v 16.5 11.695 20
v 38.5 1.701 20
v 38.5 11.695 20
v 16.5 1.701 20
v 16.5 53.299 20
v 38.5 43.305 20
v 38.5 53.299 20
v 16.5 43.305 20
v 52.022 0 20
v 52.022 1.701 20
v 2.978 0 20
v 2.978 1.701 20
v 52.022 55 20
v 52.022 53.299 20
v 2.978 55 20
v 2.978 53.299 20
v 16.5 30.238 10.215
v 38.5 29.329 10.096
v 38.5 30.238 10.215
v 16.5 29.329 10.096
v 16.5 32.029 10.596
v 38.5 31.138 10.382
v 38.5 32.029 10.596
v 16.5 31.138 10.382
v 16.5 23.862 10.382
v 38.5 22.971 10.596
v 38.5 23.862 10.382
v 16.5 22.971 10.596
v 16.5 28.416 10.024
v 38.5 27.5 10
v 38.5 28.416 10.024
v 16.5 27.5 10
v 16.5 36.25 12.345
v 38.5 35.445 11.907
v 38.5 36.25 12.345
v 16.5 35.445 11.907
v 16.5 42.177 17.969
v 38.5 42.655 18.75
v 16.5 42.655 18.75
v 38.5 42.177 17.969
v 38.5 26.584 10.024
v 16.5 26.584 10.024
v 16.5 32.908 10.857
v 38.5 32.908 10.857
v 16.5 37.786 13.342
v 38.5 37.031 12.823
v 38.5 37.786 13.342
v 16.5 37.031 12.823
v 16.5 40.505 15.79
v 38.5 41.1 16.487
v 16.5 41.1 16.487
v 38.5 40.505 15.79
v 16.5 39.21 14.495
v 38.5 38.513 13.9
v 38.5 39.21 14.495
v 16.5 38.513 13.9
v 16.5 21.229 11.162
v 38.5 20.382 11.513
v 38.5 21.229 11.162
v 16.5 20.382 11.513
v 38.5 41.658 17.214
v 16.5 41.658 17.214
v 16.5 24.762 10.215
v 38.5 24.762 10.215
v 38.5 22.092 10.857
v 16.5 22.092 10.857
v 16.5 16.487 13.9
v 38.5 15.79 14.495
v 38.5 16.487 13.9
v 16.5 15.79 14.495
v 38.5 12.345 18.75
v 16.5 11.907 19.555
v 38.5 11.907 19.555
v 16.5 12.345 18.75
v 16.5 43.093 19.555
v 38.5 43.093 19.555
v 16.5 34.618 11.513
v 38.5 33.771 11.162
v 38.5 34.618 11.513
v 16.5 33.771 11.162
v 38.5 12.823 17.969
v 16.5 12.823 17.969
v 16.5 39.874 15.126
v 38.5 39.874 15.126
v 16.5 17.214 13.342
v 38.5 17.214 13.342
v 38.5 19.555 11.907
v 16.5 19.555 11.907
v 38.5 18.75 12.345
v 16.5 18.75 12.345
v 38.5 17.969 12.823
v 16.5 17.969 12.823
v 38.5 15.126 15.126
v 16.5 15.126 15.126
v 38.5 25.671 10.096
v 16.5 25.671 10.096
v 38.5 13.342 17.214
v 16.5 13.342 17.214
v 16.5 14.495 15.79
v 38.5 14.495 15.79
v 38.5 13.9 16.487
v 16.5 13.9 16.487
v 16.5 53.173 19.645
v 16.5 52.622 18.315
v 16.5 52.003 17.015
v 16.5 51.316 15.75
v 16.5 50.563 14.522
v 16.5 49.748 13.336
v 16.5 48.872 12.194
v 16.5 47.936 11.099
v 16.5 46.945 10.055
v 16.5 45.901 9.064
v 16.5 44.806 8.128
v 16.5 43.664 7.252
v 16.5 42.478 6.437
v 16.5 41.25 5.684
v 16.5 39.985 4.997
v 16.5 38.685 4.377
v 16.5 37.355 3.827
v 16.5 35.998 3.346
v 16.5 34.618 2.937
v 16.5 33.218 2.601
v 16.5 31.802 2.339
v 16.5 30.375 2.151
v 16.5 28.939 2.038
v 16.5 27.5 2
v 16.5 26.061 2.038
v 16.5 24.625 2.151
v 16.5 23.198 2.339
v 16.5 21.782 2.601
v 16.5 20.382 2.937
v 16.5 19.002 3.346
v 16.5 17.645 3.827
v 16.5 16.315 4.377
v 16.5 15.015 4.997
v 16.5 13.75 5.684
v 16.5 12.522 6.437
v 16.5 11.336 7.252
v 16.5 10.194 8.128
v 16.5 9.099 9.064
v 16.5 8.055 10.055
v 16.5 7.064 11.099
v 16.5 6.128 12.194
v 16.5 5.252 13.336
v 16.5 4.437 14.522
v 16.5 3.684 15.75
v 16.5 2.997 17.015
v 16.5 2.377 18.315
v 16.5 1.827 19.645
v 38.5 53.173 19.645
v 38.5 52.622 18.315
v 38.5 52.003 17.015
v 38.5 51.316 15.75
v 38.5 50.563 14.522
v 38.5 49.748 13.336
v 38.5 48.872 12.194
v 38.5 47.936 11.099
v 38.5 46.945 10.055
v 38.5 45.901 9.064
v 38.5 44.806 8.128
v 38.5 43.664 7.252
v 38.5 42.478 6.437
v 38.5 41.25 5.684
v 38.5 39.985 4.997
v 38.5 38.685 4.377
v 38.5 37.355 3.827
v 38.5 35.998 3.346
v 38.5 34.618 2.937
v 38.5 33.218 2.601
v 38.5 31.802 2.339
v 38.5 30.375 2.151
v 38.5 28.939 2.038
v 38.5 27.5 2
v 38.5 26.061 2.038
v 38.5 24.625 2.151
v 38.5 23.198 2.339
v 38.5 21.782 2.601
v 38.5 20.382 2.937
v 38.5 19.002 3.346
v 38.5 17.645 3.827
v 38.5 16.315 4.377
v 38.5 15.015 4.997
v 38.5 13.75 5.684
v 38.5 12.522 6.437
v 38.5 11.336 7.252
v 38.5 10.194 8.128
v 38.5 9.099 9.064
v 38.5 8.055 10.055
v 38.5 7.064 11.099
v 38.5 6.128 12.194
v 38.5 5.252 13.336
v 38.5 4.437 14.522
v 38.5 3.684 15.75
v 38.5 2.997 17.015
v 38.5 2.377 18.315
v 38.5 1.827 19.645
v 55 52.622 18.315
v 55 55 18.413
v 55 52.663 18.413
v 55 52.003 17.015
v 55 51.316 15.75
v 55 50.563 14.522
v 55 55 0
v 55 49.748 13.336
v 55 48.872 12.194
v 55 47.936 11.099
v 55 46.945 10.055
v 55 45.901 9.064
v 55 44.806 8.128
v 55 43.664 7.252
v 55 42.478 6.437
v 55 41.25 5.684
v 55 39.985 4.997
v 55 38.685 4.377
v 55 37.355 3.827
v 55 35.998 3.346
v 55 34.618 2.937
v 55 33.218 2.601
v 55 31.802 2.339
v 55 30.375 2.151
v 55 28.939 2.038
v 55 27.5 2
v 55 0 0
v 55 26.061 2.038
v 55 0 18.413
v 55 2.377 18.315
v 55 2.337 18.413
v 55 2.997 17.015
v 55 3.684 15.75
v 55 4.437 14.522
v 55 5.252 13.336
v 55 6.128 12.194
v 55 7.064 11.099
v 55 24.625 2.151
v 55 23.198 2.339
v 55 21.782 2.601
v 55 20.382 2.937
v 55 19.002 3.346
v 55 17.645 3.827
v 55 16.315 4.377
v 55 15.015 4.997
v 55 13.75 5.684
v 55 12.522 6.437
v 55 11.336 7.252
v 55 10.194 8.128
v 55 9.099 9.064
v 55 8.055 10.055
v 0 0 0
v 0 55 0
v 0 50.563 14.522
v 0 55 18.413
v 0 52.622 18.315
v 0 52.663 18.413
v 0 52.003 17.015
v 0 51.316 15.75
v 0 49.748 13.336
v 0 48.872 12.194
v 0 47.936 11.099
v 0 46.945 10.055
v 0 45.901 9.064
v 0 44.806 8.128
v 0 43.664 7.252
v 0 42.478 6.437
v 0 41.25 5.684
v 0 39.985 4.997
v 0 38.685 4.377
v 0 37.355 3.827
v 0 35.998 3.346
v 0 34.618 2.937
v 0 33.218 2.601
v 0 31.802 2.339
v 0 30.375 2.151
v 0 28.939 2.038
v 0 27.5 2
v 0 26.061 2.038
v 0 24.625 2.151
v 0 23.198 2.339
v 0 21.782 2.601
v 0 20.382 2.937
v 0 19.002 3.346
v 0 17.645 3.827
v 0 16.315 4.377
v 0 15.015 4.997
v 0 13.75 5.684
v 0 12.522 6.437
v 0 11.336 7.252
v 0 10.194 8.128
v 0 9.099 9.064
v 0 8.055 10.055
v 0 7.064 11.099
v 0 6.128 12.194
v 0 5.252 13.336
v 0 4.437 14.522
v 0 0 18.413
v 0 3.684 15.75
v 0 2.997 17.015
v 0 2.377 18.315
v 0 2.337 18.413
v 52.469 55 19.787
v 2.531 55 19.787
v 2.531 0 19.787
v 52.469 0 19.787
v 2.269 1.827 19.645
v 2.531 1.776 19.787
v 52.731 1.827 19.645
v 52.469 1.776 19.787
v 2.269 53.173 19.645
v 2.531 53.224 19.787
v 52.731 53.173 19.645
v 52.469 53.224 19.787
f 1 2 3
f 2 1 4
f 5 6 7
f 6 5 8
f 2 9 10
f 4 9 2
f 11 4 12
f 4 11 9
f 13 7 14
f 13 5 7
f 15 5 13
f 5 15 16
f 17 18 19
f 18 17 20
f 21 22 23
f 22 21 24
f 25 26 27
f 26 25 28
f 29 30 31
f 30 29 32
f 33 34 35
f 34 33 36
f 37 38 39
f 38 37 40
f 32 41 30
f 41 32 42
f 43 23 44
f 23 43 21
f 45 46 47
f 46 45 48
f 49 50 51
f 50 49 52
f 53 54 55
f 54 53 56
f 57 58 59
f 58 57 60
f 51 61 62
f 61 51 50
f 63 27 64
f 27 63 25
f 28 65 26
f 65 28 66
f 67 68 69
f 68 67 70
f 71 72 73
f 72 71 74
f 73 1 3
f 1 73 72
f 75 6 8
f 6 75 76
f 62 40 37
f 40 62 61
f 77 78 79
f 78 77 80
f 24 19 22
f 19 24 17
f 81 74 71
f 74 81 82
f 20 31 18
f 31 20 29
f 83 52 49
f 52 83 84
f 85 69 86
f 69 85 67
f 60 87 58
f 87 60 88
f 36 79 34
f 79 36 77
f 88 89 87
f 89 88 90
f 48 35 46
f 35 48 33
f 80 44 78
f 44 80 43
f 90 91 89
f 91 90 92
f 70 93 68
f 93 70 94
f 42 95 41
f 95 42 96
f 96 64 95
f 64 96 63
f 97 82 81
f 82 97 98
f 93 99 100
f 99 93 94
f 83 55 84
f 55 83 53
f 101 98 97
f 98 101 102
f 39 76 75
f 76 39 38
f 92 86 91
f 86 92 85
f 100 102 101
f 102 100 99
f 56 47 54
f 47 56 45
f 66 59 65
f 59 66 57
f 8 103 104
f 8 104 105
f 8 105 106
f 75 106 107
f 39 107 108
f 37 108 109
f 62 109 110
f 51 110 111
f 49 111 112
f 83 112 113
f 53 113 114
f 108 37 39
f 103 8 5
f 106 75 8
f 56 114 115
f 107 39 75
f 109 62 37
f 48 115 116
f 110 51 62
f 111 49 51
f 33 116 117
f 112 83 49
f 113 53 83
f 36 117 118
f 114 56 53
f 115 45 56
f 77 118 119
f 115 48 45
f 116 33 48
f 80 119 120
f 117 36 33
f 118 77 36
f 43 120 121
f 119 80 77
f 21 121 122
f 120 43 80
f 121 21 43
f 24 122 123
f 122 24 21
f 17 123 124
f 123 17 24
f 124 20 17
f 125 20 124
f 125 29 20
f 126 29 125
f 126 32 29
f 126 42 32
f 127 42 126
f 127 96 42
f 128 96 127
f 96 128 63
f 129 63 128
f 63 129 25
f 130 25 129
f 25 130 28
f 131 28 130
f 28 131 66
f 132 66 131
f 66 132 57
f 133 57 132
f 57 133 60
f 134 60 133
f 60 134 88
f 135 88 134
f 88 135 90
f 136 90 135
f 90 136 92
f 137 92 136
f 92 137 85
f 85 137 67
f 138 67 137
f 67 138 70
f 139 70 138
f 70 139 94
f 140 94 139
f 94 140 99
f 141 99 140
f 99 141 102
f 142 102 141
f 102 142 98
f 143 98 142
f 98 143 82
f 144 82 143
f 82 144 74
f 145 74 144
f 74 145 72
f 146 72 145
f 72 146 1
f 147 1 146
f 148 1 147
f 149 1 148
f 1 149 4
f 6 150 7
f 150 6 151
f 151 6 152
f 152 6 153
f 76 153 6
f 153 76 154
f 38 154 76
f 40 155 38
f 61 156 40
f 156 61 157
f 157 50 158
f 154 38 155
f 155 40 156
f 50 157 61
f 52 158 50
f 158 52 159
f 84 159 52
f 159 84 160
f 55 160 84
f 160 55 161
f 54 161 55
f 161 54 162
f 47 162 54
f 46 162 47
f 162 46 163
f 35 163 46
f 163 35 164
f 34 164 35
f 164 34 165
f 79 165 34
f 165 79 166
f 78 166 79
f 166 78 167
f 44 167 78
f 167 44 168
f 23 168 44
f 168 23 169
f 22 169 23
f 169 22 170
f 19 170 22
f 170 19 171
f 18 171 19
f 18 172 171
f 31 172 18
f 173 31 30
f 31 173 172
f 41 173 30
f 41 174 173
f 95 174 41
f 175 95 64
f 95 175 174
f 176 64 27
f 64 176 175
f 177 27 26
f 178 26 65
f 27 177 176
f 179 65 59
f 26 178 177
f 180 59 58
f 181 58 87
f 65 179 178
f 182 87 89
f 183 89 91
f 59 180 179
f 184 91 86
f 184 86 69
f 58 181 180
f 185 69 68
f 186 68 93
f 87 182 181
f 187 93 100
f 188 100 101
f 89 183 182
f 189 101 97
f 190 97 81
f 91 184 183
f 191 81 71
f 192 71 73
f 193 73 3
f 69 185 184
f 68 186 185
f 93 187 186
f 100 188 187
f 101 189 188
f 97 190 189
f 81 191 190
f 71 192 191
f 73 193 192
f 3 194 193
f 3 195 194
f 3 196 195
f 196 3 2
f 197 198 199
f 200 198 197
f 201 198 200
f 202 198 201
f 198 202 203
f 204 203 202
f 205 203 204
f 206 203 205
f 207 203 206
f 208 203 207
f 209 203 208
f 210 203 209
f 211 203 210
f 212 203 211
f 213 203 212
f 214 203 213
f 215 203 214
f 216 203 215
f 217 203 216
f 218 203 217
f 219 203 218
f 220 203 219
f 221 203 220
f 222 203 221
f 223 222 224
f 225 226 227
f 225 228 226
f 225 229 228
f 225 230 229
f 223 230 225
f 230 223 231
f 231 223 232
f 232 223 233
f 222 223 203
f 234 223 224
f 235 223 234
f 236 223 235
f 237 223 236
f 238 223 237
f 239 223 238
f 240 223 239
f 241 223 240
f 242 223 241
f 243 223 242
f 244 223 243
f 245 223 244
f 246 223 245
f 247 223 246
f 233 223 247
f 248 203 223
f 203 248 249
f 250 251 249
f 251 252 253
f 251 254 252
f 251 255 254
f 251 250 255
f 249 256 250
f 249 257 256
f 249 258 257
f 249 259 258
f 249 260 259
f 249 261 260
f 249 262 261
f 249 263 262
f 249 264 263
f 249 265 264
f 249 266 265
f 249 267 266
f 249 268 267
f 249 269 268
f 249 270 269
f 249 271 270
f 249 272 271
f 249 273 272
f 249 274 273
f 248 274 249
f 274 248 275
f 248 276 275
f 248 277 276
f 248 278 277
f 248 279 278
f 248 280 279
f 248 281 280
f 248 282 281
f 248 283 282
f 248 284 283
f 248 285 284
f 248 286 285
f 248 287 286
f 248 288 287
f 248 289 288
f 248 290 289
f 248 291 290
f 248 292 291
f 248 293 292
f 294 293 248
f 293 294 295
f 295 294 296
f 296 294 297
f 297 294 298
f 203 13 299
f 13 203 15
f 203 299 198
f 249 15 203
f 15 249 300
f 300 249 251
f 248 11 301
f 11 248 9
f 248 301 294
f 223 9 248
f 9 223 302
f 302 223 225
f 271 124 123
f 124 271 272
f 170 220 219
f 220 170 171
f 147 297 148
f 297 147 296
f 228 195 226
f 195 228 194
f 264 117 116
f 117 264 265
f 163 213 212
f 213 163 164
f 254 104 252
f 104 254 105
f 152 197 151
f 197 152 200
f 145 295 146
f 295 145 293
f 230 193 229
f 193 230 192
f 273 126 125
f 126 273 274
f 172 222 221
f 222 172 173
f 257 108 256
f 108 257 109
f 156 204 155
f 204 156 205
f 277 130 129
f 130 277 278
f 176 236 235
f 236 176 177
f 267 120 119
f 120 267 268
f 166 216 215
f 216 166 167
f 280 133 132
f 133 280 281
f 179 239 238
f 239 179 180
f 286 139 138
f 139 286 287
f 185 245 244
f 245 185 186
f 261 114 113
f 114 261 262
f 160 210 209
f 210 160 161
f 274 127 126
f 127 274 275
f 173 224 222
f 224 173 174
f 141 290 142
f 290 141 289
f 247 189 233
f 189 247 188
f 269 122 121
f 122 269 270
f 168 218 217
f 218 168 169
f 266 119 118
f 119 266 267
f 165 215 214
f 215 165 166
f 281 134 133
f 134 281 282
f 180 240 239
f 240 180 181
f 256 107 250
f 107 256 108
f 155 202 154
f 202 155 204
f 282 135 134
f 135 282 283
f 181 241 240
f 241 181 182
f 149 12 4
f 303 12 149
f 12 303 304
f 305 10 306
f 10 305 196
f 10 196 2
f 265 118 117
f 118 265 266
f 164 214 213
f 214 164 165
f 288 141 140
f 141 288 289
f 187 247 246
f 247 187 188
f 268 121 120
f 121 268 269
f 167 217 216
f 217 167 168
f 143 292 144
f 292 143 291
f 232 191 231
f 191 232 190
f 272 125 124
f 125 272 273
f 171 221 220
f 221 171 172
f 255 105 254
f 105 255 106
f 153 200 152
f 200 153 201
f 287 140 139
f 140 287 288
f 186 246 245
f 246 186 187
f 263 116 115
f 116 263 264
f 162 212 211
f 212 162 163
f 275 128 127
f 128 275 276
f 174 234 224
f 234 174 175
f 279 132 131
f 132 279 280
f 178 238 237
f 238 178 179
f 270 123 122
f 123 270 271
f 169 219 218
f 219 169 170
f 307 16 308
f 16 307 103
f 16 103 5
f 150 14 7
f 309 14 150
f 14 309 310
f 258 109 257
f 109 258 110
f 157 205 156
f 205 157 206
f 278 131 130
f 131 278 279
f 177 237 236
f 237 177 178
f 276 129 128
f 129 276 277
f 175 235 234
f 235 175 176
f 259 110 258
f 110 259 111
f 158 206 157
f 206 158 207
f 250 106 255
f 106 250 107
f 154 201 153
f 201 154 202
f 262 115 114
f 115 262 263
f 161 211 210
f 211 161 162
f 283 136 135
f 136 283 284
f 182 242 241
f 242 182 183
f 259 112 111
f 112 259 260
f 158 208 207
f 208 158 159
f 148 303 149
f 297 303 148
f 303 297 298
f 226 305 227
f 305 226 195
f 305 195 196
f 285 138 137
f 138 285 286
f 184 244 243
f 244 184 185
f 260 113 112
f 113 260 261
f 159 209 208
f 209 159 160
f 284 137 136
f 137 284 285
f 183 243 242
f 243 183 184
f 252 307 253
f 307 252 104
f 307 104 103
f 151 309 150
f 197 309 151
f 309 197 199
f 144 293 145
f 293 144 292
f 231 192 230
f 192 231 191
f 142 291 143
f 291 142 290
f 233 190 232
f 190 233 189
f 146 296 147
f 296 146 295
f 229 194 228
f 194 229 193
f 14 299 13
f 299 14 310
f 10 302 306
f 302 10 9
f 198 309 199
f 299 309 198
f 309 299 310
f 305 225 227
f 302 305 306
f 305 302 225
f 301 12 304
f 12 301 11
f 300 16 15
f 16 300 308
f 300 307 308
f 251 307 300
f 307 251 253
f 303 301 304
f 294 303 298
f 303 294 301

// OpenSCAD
////////////////////////////
// VARIABLES



/* [Wheel] */

//Wheel Diameter
wheelDiameter = 55;

wheelRadius = wheelDiameter/2;

//Thickness of Entire Wheel Structure
wheelThickness = 54;

//Space Between Wheels
wheelSpace = 22;


/* [Brake] */

//Height of Brake
boxHeight = 20;

boxThickness = wheelThickness+1;

//Brake Floor Thickness
boxBottomThickness = 2;

//Approx Groove Size for Inner Brace
innerBraceGroove = 35;


/* [Hidden] */
$fn=120;


////////////////////////////
// RENDER
intersection()
{
    //ROUNDED CORNER
    translate([boxThickness/2,wheelDiameter,-((wheelThickness+1)*(17/32))]) rotate([90,0,0]) cylinder(r=wheelThickness+1, h=wheelDiameter);
    
    union()
    {
        translate ([((wheelThickness+1)/2)-(wheelSpace/2),0,(wheelDiameter/2)])
        //INNER BRACE
        difference()
        {
            //BRACE
            translate([0,wheelDiameter/2,0]) rotate([0,90,0]) 
                cylinder(h=wheelSpace, d=wheelDiameter);
                        
            union()
            {
                //Brace Top Subtraction
                translate([-(wheelThickness/2) + (wheelSpace/2) ,0,boxHeight-(wheelRadius)]) 
                    cube([wheelThickness, wheelDiameter+1, wheelDiameter - boxHeight]);
                //Brace Groove Subtraction
                translate([-.1,wheelDiameter/2,0]) rotate([0,90,0]) cylinder(h=wheelSpace+1, d=innerBraceGroove);
             }
        }
        
        //MAIN BLOCK
        difference()
        {
        
            cube([boxThickness,wheelDiameter,boxHeight]);
            
            rotate([0,90,0])
             translate([-(wheelDiameter/2+boxBottomThickness),wheelDiameter/2,-.1])
         cylinder (h=wheelThickness+2, d=wheelDiameter);
            
            
        }
    }
}
////////////////////////////
// MODULES

